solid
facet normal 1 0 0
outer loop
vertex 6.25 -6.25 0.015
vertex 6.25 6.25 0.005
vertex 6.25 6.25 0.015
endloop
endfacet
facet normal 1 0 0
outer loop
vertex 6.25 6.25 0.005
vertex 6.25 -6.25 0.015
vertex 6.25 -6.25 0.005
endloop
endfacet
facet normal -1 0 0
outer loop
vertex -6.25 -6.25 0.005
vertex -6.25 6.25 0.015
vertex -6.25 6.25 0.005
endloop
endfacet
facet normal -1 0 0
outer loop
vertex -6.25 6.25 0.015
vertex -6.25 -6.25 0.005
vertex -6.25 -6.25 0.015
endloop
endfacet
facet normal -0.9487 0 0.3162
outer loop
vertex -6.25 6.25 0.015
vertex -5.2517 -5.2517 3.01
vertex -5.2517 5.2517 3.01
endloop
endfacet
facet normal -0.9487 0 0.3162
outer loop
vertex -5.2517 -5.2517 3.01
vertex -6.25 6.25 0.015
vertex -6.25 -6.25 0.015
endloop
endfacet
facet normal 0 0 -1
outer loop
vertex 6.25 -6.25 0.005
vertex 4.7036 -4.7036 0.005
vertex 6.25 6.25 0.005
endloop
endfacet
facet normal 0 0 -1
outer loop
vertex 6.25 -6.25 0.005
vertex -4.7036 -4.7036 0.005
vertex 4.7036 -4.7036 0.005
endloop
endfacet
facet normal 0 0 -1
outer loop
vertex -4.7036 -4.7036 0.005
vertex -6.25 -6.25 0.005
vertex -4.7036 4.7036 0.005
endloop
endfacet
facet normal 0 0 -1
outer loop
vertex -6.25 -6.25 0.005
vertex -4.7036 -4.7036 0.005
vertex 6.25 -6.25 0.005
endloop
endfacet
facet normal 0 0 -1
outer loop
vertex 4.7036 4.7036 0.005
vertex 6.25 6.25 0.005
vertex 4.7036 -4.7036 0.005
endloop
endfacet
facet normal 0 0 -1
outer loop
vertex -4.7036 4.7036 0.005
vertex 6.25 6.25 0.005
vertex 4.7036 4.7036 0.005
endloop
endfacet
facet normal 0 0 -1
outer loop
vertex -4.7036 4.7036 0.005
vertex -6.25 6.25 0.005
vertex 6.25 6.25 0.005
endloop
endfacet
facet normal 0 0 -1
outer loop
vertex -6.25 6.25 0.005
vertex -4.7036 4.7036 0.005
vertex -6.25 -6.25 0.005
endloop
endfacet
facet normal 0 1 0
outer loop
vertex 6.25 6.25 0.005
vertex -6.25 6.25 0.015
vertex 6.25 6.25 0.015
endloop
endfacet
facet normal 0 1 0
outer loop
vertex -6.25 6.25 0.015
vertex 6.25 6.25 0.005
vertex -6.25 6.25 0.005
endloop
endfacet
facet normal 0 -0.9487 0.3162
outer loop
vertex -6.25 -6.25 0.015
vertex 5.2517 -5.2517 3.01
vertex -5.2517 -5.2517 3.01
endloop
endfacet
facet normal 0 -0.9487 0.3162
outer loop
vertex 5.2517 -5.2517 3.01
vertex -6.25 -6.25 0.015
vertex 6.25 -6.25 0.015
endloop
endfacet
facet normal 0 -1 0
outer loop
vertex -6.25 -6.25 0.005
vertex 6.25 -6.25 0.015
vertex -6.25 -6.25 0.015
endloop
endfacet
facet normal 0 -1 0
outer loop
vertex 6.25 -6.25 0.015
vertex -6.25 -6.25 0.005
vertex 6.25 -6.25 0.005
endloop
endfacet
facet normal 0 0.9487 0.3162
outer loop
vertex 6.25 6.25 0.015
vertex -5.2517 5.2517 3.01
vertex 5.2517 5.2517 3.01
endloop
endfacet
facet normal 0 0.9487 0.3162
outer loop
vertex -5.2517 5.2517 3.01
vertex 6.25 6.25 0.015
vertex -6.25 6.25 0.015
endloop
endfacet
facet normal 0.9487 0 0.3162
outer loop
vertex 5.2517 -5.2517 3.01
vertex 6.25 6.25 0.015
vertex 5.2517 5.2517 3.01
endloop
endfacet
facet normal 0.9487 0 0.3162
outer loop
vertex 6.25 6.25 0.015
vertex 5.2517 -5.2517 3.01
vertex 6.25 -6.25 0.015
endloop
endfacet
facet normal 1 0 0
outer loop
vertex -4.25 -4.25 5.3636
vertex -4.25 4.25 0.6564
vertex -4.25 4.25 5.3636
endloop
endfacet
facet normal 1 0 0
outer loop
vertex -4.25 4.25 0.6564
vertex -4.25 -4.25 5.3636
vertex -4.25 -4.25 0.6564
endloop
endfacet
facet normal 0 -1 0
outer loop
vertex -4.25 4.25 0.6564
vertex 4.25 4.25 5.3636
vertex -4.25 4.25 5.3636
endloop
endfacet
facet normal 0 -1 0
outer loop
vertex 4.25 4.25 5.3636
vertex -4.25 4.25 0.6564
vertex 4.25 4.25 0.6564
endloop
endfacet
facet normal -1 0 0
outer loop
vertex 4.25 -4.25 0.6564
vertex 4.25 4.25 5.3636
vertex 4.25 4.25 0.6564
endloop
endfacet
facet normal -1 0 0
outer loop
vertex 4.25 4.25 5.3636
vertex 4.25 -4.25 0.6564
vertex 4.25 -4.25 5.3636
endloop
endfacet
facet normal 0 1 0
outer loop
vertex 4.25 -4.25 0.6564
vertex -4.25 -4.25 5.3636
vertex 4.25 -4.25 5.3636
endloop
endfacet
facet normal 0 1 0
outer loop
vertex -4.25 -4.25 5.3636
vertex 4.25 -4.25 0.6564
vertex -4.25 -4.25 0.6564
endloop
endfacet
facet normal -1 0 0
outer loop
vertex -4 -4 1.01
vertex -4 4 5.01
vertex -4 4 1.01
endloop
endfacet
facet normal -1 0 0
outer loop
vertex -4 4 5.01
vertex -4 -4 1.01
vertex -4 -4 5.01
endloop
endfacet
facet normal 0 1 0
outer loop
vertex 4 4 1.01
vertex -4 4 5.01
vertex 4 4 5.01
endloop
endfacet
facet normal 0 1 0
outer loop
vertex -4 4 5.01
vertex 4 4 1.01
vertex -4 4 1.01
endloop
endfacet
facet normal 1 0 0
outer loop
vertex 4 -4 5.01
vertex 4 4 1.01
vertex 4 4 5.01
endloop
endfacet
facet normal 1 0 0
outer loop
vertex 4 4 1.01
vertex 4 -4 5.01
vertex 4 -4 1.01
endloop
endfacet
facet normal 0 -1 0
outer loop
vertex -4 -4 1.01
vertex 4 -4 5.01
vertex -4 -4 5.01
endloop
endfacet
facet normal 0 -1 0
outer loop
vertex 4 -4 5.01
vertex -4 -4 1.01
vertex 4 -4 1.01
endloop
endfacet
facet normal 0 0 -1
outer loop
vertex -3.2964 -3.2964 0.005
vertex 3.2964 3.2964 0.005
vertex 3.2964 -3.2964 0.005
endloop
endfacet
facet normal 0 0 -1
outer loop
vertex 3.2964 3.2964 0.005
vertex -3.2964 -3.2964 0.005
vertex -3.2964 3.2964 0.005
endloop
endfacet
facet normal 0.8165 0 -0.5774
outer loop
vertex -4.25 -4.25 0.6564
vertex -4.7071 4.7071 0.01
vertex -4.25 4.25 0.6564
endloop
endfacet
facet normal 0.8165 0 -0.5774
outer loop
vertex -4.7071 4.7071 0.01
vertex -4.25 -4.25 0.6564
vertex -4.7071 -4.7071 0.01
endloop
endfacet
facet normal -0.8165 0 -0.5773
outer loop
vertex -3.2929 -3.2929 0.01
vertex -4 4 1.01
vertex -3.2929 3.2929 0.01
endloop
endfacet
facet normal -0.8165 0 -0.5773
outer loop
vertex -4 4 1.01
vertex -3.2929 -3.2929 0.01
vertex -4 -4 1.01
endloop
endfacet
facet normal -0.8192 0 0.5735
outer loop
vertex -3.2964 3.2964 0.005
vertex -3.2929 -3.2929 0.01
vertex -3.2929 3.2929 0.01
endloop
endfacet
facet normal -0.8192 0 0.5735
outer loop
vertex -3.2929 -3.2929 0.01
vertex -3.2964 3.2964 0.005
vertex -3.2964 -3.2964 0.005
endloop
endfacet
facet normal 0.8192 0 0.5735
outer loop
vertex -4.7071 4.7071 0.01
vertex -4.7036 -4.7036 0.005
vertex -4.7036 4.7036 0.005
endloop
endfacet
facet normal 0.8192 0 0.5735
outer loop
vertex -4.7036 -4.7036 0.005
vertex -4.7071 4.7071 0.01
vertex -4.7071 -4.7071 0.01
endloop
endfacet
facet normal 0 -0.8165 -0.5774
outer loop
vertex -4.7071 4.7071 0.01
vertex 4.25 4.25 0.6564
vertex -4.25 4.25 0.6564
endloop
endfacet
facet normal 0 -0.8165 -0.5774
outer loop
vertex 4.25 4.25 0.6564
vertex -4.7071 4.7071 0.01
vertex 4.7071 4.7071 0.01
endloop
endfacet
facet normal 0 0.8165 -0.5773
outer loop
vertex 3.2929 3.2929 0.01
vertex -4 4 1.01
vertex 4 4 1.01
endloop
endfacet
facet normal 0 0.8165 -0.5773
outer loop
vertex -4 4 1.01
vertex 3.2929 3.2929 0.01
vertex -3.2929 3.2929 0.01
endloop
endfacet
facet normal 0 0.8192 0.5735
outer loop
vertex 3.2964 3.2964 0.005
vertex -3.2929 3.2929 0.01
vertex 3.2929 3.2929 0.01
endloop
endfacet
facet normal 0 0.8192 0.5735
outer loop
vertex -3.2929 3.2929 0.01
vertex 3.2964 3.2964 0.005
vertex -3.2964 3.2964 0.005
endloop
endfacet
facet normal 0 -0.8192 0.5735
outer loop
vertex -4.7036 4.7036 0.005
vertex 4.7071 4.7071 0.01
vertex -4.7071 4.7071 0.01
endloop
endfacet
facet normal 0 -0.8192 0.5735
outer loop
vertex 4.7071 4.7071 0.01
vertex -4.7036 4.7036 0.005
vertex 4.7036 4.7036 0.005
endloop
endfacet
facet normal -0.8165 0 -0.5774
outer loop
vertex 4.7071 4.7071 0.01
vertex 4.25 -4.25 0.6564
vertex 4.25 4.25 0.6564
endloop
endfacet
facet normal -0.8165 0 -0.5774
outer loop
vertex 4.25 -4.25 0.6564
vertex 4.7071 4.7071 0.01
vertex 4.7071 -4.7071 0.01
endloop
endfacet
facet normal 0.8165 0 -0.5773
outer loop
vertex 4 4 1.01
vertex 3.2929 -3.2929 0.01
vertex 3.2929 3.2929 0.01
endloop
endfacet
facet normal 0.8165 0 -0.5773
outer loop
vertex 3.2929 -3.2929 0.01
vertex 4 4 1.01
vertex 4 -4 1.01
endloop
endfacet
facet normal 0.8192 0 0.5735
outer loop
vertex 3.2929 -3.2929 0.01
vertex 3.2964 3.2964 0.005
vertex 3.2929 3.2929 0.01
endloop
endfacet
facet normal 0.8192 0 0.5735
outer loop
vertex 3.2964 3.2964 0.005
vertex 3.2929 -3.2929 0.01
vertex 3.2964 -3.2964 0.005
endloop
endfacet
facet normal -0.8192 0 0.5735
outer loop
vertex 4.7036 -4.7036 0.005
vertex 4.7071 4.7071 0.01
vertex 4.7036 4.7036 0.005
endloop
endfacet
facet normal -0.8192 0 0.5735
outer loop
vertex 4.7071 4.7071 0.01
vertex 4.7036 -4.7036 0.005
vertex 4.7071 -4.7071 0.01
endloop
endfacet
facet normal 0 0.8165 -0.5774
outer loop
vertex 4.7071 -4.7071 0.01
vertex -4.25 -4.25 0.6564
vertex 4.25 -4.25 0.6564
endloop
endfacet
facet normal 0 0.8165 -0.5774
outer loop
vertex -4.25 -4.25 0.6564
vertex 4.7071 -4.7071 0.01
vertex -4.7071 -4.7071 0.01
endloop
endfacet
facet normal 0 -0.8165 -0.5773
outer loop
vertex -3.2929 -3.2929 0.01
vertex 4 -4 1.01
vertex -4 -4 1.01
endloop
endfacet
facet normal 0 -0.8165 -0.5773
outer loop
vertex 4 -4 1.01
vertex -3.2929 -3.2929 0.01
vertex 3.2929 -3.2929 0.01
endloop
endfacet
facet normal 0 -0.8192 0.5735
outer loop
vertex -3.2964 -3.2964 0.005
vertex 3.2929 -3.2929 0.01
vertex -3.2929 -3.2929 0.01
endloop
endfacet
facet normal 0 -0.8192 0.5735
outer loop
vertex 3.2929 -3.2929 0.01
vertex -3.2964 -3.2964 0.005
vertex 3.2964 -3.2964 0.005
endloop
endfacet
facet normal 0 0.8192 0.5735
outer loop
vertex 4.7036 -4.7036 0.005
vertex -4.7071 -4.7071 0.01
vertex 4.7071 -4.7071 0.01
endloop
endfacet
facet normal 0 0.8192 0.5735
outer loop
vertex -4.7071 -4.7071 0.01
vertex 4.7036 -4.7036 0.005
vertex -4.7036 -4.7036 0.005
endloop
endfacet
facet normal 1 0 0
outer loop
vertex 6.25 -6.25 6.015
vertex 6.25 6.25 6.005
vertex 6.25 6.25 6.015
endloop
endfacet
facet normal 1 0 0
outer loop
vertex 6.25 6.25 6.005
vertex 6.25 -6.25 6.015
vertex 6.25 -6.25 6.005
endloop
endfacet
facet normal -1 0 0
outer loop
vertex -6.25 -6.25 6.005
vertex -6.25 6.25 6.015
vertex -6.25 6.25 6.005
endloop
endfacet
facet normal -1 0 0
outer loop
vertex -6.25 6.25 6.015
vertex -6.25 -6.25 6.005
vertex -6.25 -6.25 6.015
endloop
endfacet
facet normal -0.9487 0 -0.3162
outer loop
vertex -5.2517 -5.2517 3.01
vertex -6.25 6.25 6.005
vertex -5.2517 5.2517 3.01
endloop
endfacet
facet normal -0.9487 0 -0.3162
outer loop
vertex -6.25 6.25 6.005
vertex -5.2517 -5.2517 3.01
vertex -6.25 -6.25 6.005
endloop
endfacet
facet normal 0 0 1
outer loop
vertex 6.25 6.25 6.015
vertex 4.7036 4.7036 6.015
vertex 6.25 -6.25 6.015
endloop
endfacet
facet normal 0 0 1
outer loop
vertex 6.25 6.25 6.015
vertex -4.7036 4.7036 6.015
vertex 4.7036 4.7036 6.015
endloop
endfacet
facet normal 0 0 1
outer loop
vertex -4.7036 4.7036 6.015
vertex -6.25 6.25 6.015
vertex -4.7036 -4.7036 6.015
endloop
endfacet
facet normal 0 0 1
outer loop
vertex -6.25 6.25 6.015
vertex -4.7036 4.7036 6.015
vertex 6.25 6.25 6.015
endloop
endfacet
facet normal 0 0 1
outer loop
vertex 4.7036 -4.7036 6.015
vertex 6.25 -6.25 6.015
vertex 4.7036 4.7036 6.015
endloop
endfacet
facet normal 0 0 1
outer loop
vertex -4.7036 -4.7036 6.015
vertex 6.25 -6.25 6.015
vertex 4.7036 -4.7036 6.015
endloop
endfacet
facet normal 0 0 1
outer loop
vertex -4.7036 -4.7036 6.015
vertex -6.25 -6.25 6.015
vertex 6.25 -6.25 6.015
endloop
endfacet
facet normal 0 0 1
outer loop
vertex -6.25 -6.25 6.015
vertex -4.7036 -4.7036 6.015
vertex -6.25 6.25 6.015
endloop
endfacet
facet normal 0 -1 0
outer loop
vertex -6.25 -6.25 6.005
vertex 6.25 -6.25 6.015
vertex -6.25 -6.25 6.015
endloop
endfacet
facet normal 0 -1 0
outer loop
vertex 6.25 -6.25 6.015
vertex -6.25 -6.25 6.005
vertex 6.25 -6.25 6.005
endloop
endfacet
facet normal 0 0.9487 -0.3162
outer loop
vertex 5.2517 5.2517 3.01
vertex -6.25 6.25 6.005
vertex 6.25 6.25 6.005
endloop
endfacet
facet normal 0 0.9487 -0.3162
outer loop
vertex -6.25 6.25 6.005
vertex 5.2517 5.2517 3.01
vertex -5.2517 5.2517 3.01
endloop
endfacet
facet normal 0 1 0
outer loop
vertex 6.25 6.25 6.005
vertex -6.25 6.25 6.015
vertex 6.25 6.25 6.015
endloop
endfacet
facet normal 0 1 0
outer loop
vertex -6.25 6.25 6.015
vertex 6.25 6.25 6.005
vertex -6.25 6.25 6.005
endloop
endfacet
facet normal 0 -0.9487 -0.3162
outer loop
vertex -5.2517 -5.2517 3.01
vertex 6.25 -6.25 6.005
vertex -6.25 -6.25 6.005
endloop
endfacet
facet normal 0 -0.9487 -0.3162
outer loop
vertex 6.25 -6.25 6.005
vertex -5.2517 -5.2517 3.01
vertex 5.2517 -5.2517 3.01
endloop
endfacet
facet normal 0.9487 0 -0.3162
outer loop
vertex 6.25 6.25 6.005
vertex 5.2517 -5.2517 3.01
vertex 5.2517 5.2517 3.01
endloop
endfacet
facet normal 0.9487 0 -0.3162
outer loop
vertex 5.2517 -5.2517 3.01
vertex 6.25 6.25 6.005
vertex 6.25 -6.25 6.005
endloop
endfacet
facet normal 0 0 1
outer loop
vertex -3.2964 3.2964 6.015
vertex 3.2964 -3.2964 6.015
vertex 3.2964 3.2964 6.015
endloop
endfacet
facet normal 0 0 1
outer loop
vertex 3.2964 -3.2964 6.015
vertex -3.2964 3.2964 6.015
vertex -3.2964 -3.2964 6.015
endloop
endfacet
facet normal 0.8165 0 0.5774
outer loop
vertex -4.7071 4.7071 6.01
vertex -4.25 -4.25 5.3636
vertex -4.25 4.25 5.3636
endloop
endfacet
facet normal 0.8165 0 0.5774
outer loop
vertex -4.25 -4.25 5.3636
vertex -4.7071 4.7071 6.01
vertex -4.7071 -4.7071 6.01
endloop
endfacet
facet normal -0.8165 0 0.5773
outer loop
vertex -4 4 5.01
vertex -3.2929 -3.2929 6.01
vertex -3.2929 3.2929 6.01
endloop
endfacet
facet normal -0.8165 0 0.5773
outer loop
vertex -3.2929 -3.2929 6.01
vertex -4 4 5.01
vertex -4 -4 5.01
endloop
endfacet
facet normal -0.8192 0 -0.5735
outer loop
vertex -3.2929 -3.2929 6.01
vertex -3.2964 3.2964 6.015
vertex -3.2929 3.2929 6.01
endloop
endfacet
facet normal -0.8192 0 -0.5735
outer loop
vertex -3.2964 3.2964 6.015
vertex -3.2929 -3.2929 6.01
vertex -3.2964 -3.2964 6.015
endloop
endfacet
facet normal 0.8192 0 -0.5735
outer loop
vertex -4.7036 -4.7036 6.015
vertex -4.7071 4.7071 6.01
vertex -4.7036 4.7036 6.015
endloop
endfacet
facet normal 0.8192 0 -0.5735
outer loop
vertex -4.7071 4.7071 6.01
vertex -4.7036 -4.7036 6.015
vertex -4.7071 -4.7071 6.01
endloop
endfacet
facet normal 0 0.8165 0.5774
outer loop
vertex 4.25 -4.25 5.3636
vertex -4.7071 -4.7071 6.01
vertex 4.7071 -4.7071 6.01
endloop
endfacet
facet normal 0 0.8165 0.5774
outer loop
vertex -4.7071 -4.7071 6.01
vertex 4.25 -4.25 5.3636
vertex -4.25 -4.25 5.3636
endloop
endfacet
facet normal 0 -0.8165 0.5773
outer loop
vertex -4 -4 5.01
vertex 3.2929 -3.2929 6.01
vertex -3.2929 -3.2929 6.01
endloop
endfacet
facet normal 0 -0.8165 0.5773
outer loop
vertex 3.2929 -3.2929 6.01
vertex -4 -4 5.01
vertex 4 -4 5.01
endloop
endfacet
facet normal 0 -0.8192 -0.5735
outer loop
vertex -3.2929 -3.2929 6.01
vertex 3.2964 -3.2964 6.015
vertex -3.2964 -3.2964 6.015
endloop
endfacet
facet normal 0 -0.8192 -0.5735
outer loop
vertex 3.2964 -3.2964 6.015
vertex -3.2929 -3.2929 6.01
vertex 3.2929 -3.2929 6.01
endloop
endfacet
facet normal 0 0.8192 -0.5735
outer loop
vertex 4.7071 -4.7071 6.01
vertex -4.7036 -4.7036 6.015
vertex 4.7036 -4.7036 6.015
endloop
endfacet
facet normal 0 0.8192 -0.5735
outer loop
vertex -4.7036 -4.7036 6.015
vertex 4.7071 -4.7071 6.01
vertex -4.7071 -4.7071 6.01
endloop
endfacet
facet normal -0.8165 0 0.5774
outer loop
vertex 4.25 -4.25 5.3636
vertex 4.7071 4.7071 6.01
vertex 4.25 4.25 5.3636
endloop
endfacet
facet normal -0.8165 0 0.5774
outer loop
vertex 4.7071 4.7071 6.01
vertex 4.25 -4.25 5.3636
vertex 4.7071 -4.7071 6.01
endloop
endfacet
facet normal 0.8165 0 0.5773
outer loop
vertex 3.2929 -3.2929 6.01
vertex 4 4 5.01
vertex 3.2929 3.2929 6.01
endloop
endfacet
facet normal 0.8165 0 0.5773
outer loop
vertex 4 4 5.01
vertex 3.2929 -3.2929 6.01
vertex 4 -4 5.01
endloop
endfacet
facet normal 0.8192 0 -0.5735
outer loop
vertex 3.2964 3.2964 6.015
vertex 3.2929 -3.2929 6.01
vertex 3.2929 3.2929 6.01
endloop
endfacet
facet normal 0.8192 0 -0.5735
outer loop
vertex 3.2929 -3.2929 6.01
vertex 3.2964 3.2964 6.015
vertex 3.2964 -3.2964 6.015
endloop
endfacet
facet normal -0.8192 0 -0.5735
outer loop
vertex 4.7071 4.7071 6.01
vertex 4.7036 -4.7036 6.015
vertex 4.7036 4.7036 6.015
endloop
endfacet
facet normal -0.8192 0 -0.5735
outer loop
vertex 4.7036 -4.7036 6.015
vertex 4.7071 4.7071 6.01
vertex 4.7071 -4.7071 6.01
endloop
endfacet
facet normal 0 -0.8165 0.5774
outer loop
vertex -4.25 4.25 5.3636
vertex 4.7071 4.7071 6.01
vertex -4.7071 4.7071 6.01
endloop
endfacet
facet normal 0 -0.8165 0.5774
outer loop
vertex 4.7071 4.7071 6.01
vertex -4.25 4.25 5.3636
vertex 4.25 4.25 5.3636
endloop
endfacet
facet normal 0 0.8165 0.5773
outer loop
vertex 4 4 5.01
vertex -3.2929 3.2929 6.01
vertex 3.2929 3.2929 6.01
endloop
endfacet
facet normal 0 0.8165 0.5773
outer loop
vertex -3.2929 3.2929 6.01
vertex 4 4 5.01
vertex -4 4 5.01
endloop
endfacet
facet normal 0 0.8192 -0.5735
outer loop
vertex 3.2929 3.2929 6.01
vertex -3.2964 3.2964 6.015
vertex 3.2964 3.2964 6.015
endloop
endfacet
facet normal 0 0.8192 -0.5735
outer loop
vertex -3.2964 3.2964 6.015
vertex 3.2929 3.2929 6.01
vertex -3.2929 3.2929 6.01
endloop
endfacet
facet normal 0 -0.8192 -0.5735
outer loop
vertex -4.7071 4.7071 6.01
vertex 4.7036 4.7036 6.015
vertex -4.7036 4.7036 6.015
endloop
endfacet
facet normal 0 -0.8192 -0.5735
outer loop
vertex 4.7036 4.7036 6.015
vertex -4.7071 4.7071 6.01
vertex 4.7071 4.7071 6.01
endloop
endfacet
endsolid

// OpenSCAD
// Parametric Print-in-Place Test
// V1: 15 January 2019
// https://www.thingiverse.com/thing:3357467
// by Bikecyclist
// https://www.thingiverse.com/Bikecyclist

// Edge length of bolt
bolt_edge = 8;

// Tolerance between bolt edge and hole edge
tol = 0.25;

// Total height
h_total = 6;

// Wall thickness ("waist" is 50% of this)
th_wall = 4;

// Minimum chamfer depth (normally no need to change this)
chamfer_depth = 0.75;

/* [ HIDDEN ] */
// Small finite length to ensure proper meshing
epsilon = 0.01;

translate ([0, 0, epsilon])
{
    half_test_body ();

    rotate ([180, 0, 0])
    translate ([0, 0, -h_total])
    half_test_body ();
}

module half_test_body ()
{
    difference ()
    {
        union ()
        {
            difference ()
            {
                cylcube (d1 = bolt_edge + th_wall + 2 * tol, d2 = bolt_edge + th_wall/2 + 2 * tol, h = h_total/2);
                
                translate ([0, 0, -epsilon])
                cylcube (d = bolt_edge + 2 * tol, h = h_total/2 + 2 * epsilon);
            }
            cylcube (d = bolt_edge, h = h_total/2);
        }
        
        rotate ([0, 0, 45])
        rotate_extrude ($fn = 4)
        translate (sqrt(2) * [bolt_edge/2, 0])
        circle (r = tol + chamfer_depth, $fn = 4);
    }
}

module cylcube (d = 0, d1, d2, h)
{
    dd1 = d==0?d1:d;
    dd2 = d==0?d2:d;
    
    echo (dd1, dd2, h);
    
    hull ()
    {
        cube ([dd1, dd1, epsilon], center = true);
        
        translate ([0, 0, h])
        cube ([dd2, dd2, epsilon], center = true);
    }
}
